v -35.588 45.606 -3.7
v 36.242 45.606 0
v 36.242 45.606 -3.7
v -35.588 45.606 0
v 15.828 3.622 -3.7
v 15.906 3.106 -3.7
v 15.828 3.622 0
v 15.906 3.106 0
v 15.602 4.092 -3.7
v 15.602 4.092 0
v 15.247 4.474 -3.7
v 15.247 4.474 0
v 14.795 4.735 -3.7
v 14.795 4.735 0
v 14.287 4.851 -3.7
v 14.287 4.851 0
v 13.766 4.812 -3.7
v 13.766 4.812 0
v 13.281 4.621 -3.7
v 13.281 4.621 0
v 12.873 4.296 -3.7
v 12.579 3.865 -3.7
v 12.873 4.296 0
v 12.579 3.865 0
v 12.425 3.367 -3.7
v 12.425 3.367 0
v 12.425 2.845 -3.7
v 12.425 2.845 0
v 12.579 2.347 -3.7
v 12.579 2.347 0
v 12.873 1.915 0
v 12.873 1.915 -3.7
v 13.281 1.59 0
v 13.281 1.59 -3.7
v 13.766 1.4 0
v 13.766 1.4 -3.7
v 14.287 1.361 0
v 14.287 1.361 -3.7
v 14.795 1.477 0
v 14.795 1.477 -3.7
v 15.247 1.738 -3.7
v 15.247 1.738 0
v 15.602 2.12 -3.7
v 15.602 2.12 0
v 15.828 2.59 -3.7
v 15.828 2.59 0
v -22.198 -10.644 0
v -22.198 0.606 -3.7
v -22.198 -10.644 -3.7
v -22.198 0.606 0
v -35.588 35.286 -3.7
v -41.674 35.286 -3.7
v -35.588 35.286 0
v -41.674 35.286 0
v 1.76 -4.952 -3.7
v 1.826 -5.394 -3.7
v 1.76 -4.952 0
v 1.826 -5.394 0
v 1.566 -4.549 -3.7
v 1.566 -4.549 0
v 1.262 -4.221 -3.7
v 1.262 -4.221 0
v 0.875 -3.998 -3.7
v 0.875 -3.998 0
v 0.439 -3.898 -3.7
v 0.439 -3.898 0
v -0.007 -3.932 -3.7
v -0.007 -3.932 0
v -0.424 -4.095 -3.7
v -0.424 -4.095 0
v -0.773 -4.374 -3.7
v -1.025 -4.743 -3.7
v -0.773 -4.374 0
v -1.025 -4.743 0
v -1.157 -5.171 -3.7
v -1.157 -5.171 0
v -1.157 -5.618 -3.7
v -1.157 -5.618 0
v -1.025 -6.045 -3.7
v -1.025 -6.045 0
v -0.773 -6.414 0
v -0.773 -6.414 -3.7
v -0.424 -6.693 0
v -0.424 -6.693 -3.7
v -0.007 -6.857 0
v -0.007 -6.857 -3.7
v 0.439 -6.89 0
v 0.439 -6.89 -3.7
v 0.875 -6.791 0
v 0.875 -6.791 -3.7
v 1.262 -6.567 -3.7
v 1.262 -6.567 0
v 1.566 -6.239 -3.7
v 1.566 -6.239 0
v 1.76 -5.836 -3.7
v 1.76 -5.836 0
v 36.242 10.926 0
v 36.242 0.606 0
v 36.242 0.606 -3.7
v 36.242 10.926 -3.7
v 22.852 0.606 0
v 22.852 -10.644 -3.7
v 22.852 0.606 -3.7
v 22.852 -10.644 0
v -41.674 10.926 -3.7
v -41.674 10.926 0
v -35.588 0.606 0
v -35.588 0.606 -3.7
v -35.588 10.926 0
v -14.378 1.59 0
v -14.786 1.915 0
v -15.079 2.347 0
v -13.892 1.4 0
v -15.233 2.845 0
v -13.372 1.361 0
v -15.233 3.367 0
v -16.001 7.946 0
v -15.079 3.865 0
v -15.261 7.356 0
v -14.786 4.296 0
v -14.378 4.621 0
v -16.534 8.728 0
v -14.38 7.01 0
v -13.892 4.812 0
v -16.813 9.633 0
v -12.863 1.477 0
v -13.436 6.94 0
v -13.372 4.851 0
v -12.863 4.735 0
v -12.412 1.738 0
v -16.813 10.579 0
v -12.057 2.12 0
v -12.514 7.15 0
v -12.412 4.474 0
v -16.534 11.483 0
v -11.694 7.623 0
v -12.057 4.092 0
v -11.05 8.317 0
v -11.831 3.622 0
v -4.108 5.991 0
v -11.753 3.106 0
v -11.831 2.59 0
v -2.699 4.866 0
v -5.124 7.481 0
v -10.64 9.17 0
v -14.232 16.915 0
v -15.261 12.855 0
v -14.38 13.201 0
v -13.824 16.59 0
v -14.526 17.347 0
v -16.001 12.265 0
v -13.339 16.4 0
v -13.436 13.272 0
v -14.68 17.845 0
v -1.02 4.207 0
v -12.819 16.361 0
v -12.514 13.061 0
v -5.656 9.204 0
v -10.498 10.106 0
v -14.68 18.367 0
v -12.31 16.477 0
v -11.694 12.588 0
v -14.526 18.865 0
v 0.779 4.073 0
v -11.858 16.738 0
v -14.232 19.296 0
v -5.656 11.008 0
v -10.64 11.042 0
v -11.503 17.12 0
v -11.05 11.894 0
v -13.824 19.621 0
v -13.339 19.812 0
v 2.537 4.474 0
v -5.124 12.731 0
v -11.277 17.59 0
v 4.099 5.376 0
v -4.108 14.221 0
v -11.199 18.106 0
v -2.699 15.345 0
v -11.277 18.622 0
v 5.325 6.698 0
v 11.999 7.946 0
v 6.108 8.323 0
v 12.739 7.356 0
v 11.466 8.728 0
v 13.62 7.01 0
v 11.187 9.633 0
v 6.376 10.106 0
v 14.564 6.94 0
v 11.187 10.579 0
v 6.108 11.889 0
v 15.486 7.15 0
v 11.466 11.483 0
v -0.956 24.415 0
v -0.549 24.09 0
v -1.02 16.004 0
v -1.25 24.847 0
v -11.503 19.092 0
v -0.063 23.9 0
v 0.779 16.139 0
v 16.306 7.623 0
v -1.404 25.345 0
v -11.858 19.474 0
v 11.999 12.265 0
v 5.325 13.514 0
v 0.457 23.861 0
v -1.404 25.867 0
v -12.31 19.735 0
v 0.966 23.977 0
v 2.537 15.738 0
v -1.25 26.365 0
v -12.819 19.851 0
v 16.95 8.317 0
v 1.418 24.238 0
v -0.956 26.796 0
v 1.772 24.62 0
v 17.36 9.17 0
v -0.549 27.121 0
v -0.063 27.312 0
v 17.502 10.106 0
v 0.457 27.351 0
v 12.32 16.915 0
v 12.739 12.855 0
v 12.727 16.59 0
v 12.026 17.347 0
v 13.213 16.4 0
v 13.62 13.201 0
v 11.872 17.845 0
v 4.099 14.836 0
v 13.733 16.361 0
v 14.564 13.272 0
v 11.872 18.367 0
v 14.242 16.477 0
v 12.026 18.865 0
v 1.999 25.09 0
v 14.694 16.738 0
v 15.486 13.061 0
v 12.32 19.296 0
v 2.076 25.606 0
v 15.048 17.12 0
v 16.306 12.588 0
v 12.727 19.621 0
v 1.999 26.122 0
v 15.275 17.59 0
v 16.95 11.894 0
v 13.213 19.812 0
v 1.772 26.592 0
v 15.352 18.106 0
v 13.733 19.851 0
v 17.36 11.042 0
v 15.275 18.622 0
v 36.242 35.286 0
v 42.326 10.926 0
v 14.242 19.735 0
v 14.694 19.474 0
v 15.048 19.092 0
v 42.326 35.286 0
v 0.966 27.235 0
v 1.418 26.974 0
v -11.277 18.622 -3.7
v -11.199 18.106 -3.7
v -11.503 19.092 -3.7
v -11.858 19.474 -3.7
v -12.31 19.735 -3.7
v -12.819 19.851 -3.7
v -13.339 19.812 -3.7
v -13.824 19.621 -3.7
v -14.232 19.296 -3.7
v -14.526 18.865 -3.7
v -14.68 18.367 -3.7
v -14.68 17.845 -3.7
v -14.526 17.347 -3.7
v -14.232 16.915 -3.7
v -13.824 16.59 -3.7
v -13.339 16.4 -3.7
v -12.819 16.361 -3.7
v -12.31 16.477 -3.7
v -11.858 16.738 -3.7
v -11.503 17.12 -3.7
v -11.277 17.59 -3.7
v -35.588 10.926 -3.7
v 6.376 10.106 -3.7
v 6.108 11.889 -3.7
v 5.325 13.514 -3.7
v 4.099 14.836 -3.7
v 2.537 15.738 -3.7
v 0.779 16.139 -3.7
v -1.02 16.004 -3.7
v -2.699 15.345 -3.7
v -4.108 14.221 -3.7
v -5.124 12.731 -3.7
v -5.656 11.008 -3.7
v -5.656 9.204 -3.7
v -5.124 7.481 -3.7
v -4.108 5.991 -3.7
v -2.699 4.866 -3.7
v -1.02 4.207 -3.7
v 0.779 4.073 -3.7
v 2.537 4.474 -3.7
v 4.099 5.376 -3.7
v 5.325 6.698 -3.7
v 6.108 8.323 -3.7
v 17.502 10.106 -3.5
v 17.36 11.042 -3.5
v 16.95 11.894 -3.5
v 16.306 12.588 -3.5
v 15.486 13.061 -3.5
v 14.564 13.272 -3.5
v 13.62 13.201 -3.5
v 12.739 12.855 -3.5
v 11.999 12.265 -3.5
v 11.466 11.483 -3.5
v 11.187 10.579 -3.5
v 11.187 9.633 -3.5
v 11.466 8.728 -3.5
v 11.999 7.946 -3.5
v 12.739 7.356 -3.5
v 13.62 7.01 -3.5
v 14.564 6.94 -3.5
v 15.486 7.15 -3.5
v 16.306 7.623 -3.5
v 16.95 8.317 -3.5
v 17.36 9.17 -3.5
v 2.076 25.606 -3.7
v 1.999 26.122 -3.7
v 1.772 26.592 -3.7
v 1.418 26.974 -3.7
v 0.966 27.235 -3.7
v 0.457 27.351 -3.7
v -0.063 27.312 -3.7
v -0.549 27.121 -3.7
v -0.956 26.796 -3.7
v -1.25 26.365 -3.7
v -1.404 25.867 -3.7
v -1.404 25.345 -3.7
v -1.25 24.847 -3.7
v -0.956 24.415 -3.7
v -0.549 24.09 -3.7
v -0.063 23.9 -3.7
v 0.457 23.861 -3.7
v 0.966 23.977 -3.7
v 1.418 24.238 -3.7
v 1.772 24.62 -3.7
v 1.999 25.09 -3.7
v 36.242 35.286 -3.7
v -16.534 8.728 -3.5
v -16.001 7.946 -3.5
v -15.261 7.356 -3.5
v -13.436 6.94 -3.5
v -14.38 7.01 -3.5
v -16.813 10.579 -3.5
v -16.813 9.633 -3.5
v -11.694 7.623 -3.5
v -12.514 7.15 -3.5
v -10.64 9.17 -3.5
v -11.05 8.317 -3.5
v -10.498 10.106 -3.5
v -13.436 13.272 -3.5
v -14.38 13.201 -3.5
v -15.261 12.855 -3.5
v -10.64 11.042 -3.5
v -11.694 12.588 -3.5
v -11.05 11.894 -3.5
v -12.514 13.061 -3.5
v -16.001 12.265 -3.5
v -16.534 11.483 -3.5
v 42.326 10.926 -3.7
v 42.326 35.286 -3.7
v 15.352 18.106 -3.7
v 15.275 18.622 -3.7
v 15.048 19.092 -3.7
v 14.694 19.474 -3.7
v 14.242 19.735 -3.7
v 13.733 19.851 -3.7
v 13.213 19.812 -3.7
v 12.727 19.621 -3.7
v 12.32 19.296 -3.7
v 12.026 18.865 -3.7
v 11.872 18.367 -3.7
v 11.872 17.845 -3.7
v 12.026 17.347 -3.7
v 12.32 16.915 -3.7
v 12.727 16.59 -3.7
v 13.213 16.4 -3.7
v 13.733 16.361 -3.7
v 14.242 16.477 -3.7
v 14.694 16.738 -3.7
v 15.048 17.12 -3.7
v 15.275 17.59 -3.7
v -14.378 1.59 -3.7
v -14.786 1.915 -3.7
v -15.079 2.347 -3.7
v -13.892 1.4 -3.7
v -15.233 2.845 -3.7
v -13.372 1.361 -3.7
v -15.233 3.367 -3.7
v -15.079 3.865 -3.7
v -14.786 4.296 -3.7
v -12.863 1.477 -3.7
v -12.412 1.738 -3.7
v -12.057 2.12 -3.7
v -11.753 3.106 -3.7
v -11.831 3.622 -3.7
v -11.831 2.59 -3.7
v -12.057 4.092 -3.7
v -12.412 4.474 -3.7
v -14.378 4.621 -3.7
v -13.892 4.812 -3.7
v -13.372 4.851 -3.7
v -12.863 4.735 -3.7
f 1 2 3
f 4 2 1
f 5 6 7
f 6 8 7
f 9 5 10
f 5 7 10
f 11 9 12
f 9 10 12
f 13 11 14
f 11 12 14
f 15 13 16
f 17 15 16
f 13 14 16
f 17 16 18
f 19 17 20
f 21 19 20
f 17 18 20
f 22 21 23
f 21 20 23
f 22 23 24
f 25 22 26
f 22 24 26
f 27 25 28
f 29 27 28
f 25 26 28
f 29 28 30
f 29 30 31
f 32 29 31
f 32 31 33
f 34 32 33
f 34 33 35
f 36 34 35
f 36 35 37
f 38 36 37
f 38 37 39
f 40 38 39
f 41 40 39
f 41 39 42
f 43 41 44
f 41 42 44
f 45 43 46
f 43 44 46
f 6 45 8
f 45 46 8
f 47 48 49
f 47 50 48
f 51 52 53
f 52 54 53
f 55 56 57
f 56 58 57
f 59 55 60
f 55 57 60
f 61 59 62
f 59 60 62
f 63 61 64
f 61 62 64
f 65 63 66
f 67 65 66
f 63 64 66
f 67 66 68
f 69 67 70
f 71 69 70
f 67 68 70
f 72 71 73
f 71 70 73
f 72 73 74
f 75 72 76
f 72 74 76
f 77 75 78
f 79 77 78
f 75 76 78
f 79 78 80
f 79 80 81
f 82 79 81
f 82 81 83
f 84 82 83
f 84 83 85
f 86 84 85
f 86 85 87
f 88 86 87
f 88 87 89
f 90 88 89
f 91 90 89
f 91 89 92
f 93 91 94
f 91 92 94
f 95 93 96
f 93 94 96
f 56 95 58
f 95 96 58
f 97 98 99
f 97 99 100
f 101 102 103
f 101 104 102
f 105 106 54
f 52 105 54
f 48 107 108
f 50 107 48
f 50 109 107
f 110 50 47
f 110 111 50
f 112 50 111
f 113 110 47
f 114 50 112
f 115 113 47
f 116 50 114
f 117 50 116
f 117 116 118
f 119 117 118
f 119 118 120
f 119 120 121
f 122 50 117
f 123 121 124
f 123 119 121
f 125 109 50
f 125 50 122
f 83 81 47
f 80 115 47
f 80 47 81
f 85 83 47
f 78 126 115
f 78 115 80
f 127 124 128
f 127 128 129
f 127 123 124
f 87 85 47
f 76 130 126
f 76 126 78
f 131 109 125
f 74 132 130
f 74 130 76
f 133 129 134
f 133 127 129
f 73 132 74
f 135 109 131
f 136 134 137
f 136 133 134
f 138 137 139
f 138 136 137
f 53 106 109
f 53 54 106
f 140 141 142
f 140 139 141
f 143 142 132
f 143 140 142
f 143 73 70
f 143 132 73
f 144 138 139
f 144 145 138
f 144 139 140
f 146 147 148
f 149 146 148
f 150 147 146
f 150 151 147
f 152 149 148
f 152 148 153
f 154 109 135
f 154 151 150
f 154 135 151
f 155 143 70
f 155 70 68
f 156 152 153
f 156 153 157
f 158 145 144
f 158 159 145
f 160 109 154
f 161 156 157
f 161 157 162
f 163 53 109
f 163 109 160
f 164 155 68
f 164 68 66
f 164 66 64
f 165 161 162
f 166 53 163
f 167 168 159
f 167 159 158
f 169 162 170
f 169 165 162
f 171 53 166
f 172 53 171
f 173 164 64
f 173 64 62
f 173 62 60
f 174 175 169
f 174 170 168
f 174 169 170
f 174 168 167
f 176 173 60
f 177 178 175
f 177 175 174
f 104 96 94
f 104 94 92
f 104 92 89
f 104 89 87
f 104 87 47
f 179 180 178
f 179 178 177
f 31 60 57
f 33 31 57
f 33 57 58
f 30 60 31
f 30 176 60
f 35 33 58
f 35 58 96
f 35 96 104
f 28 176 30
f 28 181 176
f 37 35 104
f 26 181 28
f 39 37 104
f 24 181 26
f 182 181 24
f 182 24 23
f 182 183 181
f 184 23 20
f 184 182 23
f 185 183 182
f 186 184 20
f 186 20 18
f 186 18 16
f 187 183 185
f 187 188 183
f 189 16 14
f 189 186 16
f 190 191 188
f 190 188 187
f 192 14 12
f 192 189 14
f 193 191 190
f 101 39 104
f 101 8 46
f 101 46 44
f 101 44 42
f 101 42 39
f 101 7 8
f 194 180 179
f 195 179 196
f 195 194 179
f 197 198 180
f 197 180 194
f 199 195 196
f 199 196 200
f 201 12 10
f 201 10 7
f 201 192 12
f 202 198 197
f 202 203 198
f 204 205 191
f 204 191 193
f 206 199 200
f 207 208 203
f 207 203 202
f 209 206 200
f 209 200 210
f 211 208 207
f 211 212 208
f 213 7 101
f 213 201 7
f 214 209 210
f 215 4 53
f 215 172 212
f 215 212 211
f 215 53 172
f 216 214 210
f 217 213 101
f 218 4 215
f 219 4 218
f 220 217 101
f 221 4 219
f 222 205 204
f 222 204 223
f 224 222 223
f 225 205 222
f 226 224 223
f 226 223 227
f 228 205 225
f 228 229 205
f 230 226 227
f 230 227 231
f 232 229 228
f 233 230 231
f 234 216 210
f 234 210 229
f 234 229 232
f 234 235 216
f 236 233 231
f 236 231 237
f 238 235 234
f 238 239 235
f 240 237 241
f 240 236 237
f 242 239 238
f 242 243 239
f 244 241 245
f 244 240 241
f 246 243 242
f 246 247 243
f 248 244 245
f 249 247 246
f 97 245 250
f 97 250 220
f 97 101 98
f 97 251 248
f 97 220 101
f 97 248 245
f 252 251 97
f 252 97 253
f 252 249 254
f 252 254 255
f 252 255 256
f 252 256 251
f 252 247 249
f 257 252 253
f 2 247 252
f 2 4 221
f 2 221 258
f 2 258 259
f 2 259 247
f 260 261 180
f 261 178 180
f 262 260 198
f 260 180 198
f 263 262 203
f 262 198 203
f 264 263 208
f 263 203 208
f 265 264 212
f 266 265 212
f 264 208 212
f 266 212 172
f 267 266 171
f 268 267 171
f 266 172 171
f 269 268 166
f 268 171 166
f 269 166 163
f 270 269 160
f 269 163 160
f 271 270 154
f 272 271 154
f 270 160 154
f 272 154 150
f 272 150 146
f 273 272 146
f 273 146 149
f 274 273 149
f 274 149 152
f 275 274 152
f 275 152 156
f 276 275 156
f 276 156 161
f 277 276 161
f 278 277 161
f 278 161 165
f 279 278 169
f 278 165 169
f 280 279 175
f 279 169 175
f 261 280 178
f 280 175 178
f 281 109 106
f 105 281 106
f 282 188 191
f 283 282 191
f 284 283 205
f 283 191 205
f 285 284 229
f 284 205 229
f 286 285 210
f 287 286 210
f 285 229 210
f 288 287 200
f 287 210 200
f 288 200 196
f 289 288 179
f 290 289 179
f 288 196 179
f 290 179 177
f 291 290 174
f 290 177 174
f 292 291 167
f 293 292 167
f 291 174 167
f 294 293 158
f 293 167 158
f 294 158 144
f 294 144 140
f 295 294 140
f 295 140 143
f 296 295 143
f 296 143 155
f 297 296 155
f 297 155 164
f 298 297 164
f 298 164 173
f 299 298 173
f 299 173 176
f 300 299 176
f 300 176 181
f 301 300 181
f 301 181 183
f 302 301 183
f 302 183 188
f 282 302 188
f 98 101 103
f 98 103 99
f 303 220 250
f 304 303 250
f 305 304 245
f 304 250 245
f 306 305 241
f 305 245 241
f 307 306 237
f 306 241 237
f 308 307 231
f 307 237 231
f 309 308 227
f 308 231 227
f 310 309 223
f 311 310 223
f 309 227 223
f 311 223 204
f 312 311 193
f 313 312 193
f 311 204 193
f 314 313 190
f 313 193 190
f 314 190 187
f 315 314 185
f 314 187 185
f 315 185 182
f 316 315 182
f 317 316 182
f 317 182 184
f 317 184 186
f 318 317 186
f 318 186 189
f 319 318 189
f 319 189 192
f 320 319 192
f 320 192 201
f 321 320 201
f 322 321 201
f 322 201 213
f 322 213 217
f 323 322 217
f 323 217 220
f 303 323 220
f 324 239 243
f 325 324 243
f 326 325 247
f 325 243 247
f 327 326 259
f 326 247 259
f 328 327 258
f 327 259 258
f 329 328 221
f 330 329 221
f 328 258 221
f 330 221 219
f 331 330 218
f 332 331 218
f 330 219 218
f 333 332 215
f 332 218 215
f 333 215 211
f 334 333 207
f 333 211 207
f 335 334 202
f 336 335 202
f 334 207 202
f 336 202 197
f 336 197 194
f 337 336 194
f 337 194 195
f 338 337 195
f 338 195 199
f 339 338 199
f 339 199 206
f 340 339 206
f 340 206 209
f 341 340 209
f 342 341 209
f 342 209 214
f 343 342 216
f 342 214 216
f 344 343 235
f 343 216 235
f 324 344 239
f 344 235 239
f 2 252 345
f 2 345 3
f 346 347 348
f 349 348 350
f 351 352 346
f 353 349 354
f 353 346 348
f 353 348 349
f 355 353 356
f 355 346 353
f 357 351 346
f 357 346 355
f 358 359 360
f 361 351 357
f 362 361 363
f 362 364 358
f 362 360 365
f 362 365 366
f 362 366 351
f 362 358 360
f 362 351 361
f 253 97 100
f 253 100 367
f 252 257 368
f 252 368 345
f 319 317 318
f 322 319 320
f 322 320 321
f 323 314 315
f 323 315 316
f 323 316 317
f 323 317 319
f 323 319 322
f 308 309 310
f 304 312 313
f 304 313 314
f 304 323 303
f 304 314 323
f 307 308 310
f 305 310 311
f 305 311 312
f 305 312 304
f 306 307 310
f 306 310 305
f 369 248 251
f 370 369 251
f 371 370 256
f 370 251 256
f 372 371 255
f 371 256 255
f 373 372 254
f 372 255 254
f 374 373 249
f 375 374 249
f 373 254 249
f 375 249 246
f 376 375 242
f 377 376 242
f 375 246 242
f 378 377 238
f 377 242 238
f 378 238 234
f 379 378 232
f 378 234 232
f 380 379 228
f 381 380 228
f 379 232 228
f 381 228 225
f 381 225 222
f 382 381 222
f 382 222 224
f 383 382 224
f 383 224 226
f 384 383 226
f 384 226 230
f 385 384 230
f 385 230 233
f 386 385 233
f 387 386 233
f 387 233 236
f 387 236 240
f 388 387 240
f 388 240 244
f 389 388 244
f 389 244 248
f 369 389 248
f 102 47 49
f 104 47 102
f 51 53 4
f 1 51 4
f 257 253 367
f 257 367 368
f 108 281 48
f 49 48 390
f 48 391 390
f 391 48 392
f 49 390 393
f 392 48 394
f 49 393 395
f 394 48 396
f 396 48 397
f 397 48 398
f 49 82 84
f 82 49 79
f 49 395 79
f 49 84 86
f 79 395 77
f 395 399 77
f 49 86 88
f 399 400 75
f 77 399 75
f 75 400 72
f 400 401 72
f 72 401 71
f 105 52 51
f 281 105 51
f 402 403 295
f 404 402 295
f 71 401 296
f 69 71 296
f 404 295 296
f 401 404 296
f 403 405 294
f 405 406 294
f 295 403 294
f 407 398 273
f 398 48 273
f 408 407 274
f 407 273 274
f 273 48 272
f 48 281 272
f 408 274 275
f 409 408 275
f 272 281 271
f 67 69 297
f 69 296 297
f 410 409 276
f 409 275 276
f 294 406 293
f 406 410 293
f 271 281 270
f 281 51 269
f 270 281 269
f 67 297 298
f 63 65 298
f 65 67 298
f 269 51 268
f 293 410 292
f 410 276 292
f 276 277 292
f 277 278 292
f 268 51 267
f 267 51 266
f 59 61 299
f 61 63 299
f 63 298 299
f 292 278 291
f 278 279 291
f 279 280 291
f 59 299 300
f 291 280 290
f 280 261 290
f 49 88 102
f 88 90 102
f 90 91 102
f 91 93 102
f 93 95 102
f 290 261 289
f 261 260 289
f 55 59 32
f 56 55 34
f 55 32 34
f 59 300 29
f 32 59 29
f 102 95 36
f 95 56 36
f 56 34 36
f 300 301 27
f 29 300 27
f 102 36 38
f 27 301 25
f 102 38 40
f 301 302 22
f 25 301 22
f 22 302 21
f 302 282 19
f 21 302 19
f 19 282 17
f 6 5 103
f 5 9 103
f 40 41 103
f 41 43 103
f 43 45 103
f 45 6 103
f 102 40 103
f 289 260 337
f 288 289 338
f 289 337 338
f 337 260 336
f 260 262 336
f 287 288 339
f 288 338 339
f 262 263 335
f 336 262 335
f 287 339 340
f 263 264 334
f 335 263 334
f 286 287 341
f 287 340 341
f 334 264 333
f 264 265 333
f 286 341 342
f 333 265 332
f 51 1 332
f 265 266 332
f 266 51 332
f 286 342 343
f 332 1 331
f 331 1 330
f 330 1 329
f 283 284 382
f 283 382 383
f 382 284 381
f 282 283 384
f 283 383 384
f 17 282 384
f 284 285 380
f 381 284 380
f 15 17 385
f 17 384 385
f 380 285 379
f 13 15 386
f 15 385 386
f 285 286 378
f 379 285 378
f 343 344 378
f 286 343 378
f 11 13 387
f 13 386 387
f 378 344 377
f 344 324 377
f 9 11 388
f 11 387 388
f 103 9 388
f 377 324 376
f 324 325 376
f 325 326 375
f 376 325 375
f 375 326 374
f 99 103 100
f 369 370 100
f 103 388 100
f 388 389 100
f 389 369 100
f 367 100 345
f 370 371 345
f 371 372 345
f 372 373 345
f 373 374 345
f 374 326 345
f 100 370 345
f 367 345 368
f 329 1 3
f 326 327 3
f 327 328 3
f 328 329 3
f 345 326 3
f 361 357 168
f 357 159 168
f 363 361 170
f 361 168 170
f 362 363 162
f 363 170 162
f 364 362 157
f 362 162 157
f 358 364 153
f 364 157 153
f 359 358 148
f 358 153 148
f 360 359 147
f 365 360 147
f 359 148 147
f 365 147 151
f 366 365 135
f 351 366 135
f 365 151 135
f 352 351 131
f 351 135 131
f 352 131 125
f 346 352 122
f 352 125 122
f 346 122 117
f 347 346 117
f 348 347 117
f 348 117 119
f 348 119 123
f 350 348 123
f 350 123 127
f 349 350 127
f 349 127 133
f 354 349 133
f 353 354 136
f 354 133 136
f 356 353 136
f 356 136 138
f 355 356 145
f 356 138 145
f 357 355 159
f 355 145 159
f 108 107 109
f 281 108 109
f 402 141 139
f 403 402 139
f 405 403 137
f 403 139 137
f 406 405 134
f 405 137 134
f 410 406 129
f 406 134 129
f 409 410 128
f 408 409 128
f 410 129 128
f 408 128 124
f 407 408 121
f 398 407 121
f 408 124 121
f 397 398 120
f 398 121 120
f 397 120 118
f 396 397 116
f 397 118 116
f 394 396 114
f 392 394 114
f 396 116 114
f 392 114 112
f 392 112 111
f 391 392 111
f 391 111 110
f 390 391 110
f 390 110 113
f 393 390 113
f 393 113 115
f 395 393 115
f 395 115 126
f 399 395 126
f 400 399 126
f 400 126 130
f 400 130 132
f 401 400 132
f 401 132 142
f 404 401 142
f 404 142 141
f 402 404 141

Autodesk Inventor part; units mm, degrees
ref_plane "YZ Plane" through (0, 0, 0) normal (1, 0, 0) x (0, 1, 0)
ref_plane "XZ Plane" through (0, 0, 0) normal (0, 1, 0) x (-1, 0, 0)
ref_plane "XY Plane" through (0, 0, 0) normal (0, 0, 1) x (1, 0, 0)
sketch "Sketch1" plane through (0, 0, 0) normal (0, 0, 1) x (1, 0, 0)
  line L0 (-22.1985, -10.6442) -> (22.8515, -10.6442)
  line L1 (22.8515, -10.6442) -> (22.8515, 0.6058)
  line L2 (22.8515, 0.6058) -> (32.8515, 0.6058)
  line L3 (32.8515, 0.6058) -> (32.8515, 45.6058)
  line L4 (32.8515, 45.6058) -> (-32.1985, 45.6058)
  line L5 (-32.1985, 45.6058) -> (-32.1985, 0.6058)
  line L6 (-32.1985, 0.6058) -> (-22.1985, 0.6058)
  line L7 (-22.1985, 0.6058) -> (-22.1985, -10.6442)
  point P0 (0, 0)
  dimension "d0" = 45.05
  dimension "d1" = 11.25
  dimension "d2" = 10
  dimension "d3" = 45
  dimension "d4" = 45
  dimension "d5" = 10
  dimension "d6" = 65.05
extrude "Extrusion1" add sketch "Sketch1" against normal blind 3.7
sketch "Sketch2" plane through (0, 0, 0) normal (0, 0, 1) x (1, 0, 0)
  point P0 (0, 0)
sketch "Sketch3" plane through (0, 0, 0) normal (0, 0, 1) x (1, 0, 0)
  circle A0 centre (0.3265, 10.1058) radius 6.05
  line L0 (-32.1985, 45.6058) -> (-32.1985, 0.6058) projected
  line L1 (-32.1985, 0.6058) -> (-22.1985, 0.6058) projected
  circle A1 centre (14.3265, 10.1058) radius 3.175
  circle A2 centre (-13.6735, 10.1058) radius 3.175
  circle A3 centre (0.3265, 10.1058) radius 15.5
  circle A4 centre (0.3265, 25.6058) radius 1.75
  circle A5 centre (0.3265, -5.3942) radius 1.5
  line L2 (32.8515, 0.6058) -> (32.8515, 45.6058) projected
  circle A6 centre (-12.9494, 18.1058) radius 1.75
  circle A7 centre (-13.5028, 3.1058) radius 1.75
  circle A8 centre (14.1558, 3.1058) radius 1.75
  circle A9 centre (13.6024, 18.1058) radius 1.75
  circle A10 centre (0.3265, 10.1058) radius 18.5
  point P0 (0, 0)
  dimension "d9" = 12.1
  dimension "d10" = 32.525
  dimension "d11" = 9.5
  dimension "d12" = 6.35
  dimension "d13" = 14
  dimension "d14" = 6.35
  dimension "d15" = 14
  dimension "d20" = 31
  dimension "d21" = 3.5
  dimension "d22" = 32.525
  dimension "d23" = 3
  dimension "d24" = 32.525
  dimension "d25" = 3.5
  dimension "d26" = 8
  dimension "d27" = 3.5
  dimension "d28" = 3.5
  dimension "d29" = 3.5
  dimension "d30" = 8
  dimension "d31" = 15
  dimension "d36" = 37
  dimension "d54" = 15
extrude "Extrusion2" cut sketch "Sketch3" against normal blind 5 contours A0
sketch "Sketch4" plane through (0, 0, 0) normal (0, 0, 1) x (1, 0, 0)
  point P0 (0, 0)
extrude "Extrusion4" cut sketch "Sketch3" against normal blind 3.5 contours A1 A3 | A3 A1 | A3 A2 | A2 A3
extrude "Extrusion5" cut sketch "Sketch3" against normal blind 5 contours A9 A3 | A3 A9 | A8 A3 | A3 A8 | A4 A3 | A3 A4 | A5 A3 | A3 A5 | A6 A3 | A3 A6 | A7 A3 | A3 A7
sketch "Sketch5" plane through (0, 0, 0) normal (0, 0, 1) x (1, 0, 0)
  point P0 (0, 0)
sketch "Sketch6" plane through (0, 0, 0) normal (0, 0, 1) x (1, 0, 0)
  line L0 (-35.5885, 45.6058) -> (-32.1985, 45.6058)
  line L1 (-32.1985, 45.6058) -> (-32.1985, 0.6058)
  line L2 (-32.1985, 0.6058) -> (-35.5885, 0.6058)
  line L3 (-35.5885, 0.6058) -> (-35.5885, 45.6058)
  line L4 (-32.1985, 45.6058) -> (-32.1985, 0.6058) projected
  line L5 (32.8515, 45.6058) -> (-32.1985, 45.6058) projected
  line L6 (-32.1985, 0.6058) -> (-22.1985, 0.6058) projected
  line L7 (32.8515, 45.6058) -> (32.8515, 0.6058)
  line L8 (32.8515, 0.6058) -> (32.8515, 45.6058) projected
  line L9 (32.8515, 0.6058) -> (36.2415, 0.6058)
  line L10 (36.2415, 0.6058) -> (36.2415, 45.6058)
  line L11 (36.2415, 45.6058) -> (32.8515, 45.6058)
  line L12 (22.8515, 0.6058) -> (32.8515, 0.6058) projected
  point P0 (0, 0)
  dimension "d37" = 0
  dimension "d38" = 0
  dimension "d39" = 0
  dimension "d40" = 3.39
  dimension "d41" = 3.39
  dimension "d42" = 0
  dimension "d43" = 0
  dimension "d44" = 0
extrude "Extrusion6" add sketch "Sketch6" against normal blind 3.7
sketch "Sketch7" plane through (0, 0, 0) normal (0, 0, 1) x (1, 0, 0)
  line L0 (30.309, 35.2858) -> (30.309, 10.9258)
  line L1 (30.309, 10.9258) -> (42.3265, 10.9258)
  line L2 (42.3265, 10.9258) -> (42.3265, 35.2858)
  line L3 (42.3265, 35.2858) -> (30.309, 35.2858)
  line L4 (36.2415, 45.6058) -> (-35.5885, 45.6058) projected
  line L5 (22.8515, 0.6058) -> (36.2415, 0.6058) projected
  line L6 (36.2415, 0.6058) -> (36.2415, 45.6058) projected
  line L7 (-41.6735, 35.2858) -> (-29.8249, 35.2858)
  line L8 (-29.8249, 35.2858) -> (-29.8249, 10.9258)
  line L9 (-29.8249, 10.9258) -> (-41.6735, 10.9258)
  line L10 (-41.6735, 10.9258) -> (-41.6735, 35.2858)
  line L11 (-35.5885, 0.6058) -> (-22.1985, 0.6058) projected
  line L12 (-35.5885, 45.6058) -> (-35.5885, 0.6058) projected
  point P0 (0, 0)
  point P1 (36.2415, 35.2858)
  point P2 (36.2415, 10.9258)
  point P3 (-35.5885, 10.9258)
  point P4 (-35.5885, 35.2858)
  dimension "d47" = 10.32
  dimension "d48" = 10.32
  dimension "d49" = 6.085
  dimension "d50" = 10.32
  dimension "d51" = 6.085
extrude "Extrusion7" add sketch "Sketch7" against normal blind 3.7 contours L12 L9 L10 L7 | L3 L2 L1 L6
properties part number "pump part"
